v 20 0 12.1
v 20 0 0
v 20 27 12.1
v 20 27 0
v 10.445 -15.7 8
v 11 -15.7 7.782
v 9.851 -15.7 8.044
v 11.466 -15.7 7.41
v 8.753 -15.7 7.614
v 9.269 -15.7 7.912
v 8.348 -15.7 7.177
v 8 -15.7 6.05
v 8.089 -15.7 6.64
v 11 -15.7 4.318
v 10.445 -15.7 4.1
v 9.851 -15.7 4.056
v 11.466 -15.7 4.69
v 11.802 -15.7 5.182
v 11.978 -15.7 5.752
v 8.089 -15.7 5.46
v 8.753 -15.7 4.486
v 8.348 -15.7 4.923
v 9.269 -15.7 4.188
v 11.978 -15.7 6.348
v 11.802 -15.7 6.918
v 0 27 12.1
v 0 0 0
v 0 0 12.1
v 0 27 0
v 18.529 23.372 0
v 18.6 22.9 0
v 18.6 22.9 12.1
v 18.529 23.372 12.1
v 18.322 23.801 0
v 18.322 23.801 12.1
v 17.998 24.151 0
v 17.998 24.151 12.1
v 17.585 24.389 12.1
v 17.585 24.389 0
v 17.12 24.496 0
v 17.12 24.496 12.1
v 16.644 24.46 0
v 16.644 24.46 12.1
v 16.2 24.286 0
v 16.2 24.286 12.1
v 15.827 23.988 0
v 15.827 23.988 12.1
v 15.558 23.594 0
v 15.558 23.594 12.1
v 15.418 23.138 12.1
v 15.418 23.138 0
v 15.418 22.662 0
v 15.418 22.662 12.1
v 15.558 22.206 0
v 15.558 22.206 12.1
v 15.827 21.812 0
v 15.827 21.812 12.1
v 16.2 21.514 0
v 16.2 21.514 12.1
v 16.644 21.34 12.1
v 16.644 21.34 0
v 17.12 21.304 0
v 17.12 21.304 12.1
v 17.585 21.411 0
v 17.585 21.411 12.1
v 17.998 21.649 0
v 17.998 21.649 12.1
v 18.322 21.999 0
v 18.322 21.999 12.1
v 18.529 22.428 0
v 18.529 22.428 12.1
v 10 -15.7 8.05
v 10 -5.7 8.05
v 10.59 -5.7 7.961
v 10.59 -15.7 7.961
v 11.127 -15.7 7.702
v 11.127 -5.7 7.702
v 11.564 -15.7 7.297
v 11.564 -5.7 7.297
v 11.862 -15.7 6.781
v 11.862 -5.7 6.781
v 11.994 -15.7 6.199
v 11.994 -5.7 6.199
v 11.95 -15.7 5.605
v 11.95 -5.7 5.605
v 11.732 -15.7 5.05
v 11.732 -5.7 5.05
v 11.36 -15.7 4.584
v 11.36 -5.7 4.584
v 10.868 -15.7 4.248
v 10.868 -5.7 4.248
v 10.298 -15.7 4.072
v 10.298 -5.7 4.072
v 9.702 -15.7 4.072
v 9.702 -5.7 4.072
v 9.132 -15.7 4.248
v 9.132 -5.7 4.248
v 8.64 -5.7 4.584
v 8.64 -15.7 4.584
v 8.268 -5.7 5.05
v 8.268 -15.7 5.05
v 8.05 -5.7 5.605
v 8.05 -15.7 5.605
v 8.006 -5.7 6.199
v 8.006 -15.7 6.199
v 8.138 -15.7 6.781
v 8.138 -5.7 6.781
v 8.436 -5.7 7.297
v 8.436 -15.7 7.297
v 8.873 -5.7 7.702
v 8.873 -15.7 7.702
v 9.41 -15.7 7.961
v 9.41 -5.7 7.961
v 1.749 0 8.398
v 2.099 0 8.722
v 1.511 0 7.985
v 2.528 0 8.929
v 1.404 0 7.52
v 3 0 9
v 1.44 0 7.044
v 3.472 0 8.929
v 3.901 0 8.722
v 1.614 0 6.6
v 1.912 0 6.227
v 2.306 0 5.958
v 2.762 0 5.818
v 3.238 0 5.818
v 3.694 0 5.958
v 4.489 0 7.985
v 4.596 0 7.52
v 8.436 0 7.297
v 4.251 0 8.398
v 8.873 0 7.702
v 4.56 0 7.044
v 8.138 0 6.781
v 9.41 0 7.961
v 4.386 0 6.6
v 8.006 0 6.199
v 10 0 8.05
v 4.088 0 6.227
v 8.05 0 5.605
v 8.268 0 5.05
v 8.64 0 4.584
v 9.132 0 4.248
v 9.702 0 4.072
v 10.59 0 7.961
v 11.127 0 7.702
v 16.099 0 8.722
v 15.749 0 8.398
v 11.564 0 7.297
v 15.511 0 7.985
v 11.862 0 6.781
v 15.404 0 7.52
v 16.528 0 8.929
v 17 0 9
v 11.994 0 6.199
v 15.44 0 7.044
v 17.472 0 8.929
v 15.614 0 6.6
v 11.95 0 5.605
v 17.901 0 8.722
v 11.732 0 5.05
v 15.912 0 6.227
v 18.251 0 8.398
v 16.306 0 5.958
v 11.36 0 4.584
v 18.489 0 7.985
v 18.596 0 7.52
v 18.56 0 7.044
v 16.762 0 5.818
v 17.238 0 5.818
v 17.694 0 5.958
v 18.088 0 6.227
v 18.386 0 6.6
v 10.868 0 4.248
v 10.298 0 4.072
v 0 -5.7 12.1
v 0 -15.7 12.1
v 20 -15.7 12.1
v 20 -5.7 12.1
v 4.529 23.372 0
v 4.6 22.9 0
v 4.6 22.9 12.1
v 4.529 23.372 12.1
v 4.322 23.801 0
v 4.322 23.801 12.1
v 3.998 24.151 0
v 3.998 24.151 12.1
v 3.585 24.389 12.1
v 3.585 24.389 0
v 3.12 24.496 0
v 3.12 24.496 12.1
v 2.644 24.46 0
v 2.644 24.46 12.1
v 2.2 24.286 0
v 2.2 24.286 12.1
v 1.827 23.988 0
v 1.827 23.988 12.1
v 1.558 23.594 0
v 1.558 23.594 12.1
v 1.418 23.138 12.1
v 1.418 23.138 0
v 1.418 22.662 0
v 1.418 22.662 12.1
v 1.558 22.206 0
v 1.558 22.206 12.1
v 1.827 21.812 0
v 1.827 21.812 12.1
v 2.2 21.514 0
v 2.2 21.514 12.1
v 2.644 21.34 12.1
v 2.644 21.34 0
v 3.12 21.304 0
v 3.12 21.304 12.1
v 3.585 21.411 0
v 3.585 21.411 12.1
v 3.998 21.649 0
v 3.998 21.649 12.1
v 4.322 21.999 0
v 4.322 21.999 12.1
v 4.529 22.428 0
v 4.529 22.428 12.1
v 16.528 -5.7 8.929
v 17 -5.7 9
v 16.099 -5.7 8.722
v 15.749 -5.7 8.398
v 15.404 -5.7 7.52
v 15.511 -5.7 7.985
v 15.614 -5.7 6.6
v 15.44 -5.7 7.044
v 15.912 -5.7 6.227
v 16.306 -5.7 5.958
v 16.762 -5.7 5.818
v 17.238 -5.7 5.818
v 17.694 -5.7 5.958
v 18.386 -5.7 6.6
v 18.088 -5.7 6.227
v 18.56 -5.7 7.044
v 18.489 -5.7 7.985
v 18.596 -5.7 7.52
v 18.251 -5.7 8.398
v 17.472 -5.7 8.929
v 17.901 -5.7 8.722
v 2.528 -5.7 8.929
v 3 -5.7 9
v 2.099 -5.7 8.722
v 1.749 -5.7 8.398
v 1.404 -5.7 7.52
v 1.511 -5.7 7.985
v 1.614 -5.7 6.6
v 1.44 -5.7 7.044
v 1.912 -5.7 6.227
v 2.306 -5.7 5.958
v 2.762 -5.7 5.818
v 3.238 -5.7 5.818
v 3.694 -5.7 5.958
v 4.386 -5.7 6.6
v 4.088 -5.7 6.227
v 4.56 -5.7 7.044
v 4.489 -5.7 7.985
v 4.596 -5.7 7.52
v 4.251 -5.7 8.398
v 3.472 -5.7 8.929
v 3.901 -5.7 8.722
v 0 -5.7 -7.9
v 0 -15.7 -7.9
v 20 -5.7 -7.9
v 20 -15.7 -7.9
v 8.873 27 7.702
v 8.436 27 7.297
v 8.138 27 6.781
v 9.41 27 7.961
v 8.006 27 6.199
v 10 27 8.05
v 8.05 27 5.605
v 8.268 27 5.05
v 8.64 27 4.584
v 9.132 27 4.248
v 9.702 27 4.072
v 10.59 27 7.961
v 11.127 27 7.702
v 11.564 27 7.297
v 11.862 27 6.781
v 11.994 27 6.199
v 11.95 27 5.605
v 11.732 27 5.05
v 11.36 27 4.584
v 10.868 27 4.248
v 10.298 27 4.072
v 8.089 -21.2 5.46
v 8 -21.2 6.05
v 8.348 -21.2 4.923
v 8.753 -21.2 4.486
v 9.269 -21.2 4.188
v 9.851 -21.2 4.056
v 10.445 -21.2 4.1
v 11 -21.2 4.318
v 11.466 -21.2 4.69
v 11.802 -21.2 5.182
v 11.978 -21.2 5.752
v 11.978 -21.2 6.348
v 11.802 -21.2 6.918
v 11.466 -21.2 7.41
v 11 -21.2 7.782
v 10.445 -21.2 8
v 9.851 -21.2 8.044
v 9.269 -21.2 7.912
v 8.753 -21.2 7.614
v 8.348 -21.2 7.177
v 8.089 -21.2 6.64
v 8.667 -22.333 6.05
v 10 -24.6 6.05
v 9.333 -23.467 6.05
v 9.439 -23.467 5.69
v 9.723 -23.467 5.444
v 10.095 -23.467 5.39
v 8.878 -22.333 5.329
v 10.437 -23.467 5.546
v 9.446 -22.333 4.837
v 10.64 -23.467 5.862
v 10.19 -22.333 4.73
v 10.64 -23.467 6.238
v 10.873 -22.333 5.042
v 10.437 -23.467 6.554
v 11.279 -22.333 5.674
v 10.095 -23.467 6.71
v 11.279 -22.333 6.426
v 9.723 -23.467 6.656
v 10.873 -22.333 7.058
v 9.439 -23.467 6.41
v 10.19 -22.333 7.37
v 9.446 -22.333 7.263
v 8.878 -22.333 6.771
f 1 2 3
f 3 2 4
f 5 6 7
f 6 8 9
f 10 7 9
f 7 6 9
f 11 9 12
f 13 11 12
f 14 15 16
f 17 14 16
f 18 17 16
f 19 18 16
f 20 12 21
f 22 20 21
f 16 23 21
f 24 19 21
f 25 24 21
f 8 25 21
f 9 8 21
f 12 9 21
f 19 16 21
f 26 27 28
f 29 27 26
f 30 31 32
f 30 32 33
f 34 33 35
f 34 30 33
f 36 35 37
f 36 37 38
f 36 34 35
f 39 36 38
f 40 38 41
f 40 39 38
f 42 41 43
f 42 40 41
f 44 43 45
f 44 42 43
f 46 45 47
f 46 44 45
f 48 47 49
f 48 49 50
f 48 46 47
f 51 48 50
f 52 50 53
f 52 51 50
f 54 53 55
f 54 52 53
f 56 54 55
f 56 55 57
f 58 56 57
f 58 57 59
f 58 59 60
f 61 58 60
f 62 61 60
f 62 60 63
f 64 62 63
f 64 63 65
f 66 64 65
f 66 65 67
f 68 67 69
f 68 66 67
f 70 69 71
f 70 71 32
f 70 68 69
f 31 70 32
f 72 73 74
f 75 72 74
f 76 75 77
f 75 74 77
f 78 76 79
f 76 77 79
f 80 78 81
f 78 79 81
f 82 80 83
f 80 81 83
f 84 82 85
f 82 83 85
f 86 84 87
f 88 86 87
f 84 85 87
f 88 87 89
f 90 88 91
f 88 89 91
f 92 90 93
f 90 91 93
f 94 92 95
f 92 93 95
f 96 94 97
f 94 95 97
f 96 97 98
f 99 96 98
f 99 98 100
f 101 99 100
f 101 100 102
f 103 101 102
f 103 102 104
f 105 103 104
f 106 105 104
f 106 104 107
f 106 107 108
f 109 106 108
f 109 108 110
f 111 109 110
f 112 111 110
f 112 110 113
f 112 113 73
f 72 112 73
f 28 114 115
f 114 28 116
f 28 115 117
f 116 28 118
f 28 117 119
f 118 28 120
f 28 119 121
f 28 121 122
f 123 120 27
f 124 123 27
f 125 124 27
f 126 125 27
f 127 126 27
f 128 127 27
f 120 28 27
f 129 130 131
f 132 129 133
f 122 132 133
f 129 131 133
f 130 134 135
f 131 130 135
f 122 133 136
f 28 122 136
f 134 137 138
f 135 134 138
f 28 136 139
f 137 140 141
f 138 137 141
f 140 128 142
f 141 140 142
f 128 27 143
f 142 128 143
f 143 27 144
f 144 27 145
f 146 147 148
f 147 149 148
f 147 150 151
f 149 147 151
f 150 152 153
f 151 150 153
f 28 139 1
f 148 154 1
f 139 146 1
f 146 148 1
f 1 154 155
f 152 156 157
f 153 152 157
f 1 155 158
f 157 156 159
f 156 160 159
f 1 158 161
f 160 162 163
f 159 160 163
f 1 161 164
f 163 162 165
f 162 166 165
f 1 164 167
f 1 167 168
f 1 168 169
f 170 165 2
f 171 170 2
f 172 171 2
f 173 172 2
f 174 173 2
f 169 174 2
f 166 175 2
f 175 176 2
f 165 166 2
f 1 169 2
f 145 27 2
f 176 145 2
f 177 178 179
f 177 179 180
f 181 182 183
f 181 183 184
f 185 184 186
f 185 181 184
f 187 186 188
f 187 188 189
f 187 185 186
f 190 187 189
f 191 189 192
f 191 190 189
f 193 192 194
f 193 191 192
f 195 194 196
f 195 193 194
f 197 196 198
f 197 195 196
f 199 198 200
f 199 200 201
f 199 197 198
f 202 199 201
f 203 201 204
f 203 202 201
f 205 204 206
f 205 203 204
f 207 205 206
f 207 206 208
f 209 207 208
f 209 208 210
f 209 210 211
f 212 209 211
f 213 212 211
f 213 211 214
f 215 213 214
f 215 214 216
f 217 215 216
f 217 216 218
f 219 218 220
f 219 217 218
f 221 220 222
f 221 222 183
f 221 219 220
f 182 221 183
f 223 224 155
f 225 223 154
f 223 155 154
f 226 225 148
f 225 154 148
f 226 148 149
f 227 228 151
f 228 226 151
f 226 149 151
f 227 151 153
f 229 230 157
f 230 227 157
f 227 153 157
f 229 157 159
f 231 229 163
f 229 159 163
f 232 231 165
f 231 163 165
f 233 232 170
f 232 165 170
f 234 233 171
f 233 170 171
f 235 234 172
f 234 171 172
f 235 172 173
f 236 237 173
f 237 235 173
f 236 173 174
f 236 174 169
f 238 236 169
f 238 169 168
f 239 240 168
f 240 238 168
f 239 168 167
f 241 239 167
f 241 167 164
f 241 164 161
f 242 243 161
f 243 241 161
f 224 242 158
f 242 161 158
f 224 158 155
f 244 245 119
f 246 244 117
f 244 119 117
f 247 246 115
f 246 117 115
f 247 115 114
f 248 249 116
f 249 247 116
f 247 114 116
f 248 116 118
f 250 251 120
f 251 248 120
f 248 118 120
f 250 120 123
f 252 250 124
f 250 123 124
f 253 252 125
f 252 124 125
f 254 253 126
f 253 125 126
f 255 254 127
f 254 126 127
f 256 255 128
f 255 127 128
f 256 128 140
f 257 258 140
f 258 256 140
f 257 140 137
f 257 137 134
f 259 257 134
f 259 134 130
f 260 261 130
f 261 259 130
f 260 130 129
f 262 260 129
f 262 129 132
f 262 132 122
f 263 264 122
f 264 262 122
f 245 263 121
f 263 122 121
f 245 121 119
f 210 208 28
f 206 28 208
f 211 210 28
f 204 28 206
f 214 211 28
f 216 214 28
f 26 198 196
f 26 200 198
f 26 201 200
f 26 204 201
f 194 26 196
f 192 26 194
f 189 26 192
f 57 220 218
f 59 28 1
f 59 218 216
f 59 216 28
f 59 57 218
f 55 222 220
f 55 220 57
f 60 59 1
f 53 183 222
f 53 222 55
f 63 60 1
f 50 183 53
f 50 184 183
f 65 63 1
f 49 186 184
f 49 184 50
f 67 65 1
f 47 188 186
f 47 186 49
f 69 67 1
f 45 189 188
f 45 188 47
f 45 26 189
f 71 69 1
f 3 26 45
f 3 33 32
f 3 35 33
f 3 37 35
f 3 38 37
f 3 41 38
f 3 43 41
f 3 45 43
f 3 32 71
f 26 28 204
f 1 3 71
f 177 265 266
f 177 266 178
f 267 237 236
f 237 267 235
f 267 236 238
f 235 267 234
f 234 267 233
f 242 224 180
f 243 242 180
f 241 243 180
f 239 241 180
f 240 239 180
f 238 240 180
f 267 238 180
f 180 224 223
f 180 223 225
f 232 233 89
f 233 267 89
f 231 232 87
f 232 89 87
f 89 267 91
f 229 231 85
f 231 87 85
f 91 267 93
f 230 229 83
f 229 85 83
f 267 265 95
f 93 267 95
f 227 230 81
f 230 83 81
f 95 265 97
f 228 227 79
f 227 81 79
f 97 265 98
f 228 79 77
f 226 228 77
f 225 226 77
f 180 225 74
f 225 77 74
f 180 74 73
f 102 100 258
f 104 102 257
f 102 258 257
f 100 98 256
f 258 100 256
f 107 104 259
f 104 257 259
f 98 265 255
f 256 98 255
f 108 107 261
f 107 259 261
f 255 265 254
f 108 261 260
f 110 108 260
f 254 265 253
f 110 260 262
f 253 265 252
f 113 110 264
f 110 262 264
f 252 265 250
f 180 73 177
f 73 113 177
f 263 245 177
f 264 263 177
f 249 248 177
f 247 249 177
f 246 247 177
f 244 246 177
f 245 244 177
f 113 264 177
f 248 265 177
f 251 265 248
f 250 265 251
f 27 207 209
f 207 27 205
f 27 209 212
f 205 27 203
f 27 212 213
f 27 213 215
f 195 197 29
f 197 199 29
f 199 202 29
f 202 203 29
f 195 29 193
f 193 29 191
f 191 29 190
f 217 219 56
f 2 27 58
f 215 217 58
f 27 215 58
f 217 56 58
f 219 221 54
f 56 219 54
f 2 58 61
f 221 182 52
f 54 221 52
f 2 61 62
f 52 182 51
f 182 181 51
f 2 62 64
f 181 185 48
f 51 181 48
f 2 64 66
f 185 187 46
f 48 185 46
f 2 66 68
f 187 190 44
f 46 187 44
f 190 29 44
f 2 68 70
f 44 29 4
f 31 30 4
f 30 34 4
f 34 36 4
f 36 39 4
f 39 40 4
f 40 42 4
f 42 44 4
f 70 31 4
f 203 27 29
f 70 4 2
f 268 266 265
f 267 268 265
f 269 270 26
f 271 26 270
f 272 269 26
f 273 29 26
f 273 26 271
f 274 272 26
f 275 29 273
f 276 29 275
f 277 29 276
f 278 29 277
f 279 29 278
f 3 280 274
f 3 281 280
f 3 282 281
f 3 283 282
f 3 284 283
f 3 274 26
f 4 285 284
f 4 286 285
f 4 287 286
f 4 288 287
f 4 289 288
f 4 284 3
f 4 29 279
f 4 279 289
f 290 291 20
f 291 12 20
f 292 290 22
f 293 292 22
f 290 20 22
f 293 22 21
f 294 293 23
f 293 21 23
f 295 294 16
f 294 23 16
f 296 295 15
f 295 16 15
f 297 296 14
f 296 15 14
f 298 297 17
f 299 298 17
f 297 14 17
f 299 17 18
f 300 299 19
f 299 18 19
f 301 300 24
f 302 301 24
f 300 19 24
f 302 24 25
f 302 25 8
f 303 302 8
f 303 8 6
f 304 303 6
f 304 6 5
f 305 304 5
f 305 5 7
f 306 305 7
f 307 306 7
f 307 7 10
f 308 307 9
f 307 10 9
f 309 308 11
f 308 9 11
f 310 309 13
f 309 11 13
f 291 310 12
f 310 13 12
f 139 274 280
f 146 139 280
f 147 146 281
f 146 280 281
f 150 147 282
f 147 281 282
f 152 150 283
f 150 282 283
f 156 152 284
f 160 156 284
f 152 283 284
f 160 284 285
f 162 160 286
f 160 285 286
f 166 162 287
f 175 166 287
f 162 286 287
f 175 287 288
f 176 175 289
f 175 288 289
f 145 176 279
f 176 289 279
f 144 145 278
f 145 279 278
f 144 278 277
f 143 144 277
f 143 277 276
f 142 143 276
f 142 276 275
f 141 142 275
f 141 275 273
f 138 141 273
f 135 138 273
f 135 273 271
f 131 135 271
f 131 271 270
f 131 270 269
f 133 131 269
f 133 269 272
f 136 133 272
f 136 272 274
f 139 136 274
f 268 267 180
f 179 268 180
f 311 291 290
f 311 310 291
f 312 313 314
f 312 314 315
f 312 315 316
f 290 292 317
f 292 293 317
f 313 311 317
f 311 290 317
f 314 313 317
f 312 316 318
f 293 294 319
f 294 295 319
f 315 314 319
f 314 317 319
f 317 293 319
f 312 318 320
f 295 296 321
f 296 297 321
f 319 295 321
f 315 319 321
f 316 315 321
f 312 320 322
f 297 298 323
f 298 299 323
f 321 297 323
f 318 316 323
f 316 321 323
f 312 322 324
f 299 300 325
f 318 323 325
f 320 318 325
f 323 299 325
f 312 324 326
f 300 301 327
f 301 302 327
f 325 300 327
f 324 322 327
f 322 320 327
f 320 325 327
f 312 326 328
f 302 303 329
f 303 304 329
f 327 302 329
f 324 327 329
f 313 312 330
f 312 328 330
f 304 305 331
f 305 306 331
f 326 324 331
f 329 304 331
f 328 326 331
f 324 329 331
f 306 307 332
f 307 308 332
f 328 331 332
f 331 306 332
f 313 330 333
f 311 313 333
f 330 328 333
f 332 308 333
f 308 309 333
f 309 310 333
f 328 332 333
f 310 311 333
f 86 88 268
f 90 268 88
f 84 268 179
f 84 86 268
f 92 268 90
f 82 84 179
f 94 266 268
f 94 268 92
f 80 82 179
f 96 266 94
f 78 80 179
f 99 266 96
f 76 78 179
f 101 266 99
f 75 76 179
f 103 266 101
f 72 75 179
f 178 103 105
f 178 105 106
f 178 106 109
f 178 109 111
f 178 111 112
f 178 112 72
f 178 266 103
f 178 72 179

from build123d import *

# Parameters (mm, degrees)
SKETCH1_W           = 20
SKETCH1_H           = 27
SKETCH1_R           = 1.6
BOSS_EXTRUDE1_DEPTH = 12.1
SKETCH2_W           = 20
SKETCH2_H           = 10
BOSS_EXTRUDE2_DEPTH = 20
BOSS_EXTRUDE3_REACH = 37.713
SKETCH3_R           = 1.6
CUT_EXTRUDE1_REACH  = 50.68
SKETCH4_R           = 2


with BuildPart() as part:
    # Sketch1 → Boss-Extrude1 (new body)
    with BuildSketch(Plane.XY):
        with Locations((10, 13.5)):
            Rectangle(SKETCH1_W, SKETCH1_H)
        with Locations((3, 22.9)):
            Circle(SKETCH1_R, mode=Mode.SUBTRACT)
        with Locations((17, 22.9)):
            Circle(SKETCH1_R, mode=Mode.SUBTRACT)
    extrude(amount=BOSS_EXTRUDE1_DEPTH)


with BuildPart() as body_2:
    # Sketch2 → Boss-Extrude2 (new body)
    with BuildSketch(Plane.ZY):
        with Locations((2.1, -10.7)):
            Rectangle(SKETCH2_W, SKETCH2_H)
    extrude(amount=-BOSS_EXTRUDE2_DEPTH)

    # Sketch3 → Boss-Extrude3 (add, up to next)
    with BuildSketch(Plane.XZ, mode=Mode.PRIVATE) as boss_extrude3_sk1:
        with Locations(Location((3, 7.4, 0), (0, 0, 90))):
            Circle(SKETCH3_R)
    boss_extrude3_tool1 = extrude(boss_extrude3_sk1.sketch, amount=BOSS_EXTRUDE3_REACH, mode=Mode.PRIVATE) - body_2.part
    # Sketch3 → Boss-Extrude3 (add, up to next)
    with BuildSketch(Plane.XZ, mode=Mode.PRIVATE) as boss_extrude3_sk2:
        with Locations(Location((17, 7.4, 0), (0, 0, 90))):
            Circle(SKETCH3_R)
    boss_extrude3_tool2 = extrude(boss_extrude3_sk2.sketch, amount=BOSS_EXTRUDE3_REACH, mode=Mode.PRIVATE) - body_2.part

    add(part.part)  # Boss-Extrude3 merges part
    add(boss_extrude3_tool1.solids().sort_by_distance((3, 0, 7.4))[0])
    add(boss_extrude3_tool2.solids().sort_by_distance((17, 0, 7.4))[0])

    # Cut-Extrude1: up to this face of the body (flat: up to its plane)
    cut_extrude1_end = Plane(body_2.part.faces().sort_by_distance((10, -15.7, 2.1))[0])
    # Sketch4 → Cut-Extrude1 (cut, up to the picked face)
    with BuildSketch(Plane(origin=(0, 27, 0), x_dir=(1, 0, 0), z_dir=(0, 1, 0)), mode=Mode.PRIVATE) as cut_extrude1_sk1:
        with Locations(Location((10, -6.05, 0), (0, 0, 270))):
            Circle(SKETCH4_R)
    cut_extrude1_tool1 = split(extrude(cut_extrude1_sk1.sketch, amount=-CUT_EXTRUDE1_REACH, mode=Mode.PRIVATE), bisect_by=cut_extrude1_end, keep=Keep.BOTH, mode=Mode.PRIVATE)
    add(cut_extrude1_tool1.solids().sort_by(Axis((10, 27, 6.05), (0, -1, 0)))[0], mode=Mode.SUBTRACT)


with BuildPart() as body_2_2:
    # Sketch6 → Revolve1 (revolve)
    with BuildSketch(Plane.XY.offset(6.05)):
        Polygon((8, -15.7), (10, -15.7), (10, -24.6), (8, -21.2), align=None)
    revolve(axis=Axis((10, -15.7, 6.05), (0, -1, 0)))


solid = Compound([body_2.part, body_2_2.part])
